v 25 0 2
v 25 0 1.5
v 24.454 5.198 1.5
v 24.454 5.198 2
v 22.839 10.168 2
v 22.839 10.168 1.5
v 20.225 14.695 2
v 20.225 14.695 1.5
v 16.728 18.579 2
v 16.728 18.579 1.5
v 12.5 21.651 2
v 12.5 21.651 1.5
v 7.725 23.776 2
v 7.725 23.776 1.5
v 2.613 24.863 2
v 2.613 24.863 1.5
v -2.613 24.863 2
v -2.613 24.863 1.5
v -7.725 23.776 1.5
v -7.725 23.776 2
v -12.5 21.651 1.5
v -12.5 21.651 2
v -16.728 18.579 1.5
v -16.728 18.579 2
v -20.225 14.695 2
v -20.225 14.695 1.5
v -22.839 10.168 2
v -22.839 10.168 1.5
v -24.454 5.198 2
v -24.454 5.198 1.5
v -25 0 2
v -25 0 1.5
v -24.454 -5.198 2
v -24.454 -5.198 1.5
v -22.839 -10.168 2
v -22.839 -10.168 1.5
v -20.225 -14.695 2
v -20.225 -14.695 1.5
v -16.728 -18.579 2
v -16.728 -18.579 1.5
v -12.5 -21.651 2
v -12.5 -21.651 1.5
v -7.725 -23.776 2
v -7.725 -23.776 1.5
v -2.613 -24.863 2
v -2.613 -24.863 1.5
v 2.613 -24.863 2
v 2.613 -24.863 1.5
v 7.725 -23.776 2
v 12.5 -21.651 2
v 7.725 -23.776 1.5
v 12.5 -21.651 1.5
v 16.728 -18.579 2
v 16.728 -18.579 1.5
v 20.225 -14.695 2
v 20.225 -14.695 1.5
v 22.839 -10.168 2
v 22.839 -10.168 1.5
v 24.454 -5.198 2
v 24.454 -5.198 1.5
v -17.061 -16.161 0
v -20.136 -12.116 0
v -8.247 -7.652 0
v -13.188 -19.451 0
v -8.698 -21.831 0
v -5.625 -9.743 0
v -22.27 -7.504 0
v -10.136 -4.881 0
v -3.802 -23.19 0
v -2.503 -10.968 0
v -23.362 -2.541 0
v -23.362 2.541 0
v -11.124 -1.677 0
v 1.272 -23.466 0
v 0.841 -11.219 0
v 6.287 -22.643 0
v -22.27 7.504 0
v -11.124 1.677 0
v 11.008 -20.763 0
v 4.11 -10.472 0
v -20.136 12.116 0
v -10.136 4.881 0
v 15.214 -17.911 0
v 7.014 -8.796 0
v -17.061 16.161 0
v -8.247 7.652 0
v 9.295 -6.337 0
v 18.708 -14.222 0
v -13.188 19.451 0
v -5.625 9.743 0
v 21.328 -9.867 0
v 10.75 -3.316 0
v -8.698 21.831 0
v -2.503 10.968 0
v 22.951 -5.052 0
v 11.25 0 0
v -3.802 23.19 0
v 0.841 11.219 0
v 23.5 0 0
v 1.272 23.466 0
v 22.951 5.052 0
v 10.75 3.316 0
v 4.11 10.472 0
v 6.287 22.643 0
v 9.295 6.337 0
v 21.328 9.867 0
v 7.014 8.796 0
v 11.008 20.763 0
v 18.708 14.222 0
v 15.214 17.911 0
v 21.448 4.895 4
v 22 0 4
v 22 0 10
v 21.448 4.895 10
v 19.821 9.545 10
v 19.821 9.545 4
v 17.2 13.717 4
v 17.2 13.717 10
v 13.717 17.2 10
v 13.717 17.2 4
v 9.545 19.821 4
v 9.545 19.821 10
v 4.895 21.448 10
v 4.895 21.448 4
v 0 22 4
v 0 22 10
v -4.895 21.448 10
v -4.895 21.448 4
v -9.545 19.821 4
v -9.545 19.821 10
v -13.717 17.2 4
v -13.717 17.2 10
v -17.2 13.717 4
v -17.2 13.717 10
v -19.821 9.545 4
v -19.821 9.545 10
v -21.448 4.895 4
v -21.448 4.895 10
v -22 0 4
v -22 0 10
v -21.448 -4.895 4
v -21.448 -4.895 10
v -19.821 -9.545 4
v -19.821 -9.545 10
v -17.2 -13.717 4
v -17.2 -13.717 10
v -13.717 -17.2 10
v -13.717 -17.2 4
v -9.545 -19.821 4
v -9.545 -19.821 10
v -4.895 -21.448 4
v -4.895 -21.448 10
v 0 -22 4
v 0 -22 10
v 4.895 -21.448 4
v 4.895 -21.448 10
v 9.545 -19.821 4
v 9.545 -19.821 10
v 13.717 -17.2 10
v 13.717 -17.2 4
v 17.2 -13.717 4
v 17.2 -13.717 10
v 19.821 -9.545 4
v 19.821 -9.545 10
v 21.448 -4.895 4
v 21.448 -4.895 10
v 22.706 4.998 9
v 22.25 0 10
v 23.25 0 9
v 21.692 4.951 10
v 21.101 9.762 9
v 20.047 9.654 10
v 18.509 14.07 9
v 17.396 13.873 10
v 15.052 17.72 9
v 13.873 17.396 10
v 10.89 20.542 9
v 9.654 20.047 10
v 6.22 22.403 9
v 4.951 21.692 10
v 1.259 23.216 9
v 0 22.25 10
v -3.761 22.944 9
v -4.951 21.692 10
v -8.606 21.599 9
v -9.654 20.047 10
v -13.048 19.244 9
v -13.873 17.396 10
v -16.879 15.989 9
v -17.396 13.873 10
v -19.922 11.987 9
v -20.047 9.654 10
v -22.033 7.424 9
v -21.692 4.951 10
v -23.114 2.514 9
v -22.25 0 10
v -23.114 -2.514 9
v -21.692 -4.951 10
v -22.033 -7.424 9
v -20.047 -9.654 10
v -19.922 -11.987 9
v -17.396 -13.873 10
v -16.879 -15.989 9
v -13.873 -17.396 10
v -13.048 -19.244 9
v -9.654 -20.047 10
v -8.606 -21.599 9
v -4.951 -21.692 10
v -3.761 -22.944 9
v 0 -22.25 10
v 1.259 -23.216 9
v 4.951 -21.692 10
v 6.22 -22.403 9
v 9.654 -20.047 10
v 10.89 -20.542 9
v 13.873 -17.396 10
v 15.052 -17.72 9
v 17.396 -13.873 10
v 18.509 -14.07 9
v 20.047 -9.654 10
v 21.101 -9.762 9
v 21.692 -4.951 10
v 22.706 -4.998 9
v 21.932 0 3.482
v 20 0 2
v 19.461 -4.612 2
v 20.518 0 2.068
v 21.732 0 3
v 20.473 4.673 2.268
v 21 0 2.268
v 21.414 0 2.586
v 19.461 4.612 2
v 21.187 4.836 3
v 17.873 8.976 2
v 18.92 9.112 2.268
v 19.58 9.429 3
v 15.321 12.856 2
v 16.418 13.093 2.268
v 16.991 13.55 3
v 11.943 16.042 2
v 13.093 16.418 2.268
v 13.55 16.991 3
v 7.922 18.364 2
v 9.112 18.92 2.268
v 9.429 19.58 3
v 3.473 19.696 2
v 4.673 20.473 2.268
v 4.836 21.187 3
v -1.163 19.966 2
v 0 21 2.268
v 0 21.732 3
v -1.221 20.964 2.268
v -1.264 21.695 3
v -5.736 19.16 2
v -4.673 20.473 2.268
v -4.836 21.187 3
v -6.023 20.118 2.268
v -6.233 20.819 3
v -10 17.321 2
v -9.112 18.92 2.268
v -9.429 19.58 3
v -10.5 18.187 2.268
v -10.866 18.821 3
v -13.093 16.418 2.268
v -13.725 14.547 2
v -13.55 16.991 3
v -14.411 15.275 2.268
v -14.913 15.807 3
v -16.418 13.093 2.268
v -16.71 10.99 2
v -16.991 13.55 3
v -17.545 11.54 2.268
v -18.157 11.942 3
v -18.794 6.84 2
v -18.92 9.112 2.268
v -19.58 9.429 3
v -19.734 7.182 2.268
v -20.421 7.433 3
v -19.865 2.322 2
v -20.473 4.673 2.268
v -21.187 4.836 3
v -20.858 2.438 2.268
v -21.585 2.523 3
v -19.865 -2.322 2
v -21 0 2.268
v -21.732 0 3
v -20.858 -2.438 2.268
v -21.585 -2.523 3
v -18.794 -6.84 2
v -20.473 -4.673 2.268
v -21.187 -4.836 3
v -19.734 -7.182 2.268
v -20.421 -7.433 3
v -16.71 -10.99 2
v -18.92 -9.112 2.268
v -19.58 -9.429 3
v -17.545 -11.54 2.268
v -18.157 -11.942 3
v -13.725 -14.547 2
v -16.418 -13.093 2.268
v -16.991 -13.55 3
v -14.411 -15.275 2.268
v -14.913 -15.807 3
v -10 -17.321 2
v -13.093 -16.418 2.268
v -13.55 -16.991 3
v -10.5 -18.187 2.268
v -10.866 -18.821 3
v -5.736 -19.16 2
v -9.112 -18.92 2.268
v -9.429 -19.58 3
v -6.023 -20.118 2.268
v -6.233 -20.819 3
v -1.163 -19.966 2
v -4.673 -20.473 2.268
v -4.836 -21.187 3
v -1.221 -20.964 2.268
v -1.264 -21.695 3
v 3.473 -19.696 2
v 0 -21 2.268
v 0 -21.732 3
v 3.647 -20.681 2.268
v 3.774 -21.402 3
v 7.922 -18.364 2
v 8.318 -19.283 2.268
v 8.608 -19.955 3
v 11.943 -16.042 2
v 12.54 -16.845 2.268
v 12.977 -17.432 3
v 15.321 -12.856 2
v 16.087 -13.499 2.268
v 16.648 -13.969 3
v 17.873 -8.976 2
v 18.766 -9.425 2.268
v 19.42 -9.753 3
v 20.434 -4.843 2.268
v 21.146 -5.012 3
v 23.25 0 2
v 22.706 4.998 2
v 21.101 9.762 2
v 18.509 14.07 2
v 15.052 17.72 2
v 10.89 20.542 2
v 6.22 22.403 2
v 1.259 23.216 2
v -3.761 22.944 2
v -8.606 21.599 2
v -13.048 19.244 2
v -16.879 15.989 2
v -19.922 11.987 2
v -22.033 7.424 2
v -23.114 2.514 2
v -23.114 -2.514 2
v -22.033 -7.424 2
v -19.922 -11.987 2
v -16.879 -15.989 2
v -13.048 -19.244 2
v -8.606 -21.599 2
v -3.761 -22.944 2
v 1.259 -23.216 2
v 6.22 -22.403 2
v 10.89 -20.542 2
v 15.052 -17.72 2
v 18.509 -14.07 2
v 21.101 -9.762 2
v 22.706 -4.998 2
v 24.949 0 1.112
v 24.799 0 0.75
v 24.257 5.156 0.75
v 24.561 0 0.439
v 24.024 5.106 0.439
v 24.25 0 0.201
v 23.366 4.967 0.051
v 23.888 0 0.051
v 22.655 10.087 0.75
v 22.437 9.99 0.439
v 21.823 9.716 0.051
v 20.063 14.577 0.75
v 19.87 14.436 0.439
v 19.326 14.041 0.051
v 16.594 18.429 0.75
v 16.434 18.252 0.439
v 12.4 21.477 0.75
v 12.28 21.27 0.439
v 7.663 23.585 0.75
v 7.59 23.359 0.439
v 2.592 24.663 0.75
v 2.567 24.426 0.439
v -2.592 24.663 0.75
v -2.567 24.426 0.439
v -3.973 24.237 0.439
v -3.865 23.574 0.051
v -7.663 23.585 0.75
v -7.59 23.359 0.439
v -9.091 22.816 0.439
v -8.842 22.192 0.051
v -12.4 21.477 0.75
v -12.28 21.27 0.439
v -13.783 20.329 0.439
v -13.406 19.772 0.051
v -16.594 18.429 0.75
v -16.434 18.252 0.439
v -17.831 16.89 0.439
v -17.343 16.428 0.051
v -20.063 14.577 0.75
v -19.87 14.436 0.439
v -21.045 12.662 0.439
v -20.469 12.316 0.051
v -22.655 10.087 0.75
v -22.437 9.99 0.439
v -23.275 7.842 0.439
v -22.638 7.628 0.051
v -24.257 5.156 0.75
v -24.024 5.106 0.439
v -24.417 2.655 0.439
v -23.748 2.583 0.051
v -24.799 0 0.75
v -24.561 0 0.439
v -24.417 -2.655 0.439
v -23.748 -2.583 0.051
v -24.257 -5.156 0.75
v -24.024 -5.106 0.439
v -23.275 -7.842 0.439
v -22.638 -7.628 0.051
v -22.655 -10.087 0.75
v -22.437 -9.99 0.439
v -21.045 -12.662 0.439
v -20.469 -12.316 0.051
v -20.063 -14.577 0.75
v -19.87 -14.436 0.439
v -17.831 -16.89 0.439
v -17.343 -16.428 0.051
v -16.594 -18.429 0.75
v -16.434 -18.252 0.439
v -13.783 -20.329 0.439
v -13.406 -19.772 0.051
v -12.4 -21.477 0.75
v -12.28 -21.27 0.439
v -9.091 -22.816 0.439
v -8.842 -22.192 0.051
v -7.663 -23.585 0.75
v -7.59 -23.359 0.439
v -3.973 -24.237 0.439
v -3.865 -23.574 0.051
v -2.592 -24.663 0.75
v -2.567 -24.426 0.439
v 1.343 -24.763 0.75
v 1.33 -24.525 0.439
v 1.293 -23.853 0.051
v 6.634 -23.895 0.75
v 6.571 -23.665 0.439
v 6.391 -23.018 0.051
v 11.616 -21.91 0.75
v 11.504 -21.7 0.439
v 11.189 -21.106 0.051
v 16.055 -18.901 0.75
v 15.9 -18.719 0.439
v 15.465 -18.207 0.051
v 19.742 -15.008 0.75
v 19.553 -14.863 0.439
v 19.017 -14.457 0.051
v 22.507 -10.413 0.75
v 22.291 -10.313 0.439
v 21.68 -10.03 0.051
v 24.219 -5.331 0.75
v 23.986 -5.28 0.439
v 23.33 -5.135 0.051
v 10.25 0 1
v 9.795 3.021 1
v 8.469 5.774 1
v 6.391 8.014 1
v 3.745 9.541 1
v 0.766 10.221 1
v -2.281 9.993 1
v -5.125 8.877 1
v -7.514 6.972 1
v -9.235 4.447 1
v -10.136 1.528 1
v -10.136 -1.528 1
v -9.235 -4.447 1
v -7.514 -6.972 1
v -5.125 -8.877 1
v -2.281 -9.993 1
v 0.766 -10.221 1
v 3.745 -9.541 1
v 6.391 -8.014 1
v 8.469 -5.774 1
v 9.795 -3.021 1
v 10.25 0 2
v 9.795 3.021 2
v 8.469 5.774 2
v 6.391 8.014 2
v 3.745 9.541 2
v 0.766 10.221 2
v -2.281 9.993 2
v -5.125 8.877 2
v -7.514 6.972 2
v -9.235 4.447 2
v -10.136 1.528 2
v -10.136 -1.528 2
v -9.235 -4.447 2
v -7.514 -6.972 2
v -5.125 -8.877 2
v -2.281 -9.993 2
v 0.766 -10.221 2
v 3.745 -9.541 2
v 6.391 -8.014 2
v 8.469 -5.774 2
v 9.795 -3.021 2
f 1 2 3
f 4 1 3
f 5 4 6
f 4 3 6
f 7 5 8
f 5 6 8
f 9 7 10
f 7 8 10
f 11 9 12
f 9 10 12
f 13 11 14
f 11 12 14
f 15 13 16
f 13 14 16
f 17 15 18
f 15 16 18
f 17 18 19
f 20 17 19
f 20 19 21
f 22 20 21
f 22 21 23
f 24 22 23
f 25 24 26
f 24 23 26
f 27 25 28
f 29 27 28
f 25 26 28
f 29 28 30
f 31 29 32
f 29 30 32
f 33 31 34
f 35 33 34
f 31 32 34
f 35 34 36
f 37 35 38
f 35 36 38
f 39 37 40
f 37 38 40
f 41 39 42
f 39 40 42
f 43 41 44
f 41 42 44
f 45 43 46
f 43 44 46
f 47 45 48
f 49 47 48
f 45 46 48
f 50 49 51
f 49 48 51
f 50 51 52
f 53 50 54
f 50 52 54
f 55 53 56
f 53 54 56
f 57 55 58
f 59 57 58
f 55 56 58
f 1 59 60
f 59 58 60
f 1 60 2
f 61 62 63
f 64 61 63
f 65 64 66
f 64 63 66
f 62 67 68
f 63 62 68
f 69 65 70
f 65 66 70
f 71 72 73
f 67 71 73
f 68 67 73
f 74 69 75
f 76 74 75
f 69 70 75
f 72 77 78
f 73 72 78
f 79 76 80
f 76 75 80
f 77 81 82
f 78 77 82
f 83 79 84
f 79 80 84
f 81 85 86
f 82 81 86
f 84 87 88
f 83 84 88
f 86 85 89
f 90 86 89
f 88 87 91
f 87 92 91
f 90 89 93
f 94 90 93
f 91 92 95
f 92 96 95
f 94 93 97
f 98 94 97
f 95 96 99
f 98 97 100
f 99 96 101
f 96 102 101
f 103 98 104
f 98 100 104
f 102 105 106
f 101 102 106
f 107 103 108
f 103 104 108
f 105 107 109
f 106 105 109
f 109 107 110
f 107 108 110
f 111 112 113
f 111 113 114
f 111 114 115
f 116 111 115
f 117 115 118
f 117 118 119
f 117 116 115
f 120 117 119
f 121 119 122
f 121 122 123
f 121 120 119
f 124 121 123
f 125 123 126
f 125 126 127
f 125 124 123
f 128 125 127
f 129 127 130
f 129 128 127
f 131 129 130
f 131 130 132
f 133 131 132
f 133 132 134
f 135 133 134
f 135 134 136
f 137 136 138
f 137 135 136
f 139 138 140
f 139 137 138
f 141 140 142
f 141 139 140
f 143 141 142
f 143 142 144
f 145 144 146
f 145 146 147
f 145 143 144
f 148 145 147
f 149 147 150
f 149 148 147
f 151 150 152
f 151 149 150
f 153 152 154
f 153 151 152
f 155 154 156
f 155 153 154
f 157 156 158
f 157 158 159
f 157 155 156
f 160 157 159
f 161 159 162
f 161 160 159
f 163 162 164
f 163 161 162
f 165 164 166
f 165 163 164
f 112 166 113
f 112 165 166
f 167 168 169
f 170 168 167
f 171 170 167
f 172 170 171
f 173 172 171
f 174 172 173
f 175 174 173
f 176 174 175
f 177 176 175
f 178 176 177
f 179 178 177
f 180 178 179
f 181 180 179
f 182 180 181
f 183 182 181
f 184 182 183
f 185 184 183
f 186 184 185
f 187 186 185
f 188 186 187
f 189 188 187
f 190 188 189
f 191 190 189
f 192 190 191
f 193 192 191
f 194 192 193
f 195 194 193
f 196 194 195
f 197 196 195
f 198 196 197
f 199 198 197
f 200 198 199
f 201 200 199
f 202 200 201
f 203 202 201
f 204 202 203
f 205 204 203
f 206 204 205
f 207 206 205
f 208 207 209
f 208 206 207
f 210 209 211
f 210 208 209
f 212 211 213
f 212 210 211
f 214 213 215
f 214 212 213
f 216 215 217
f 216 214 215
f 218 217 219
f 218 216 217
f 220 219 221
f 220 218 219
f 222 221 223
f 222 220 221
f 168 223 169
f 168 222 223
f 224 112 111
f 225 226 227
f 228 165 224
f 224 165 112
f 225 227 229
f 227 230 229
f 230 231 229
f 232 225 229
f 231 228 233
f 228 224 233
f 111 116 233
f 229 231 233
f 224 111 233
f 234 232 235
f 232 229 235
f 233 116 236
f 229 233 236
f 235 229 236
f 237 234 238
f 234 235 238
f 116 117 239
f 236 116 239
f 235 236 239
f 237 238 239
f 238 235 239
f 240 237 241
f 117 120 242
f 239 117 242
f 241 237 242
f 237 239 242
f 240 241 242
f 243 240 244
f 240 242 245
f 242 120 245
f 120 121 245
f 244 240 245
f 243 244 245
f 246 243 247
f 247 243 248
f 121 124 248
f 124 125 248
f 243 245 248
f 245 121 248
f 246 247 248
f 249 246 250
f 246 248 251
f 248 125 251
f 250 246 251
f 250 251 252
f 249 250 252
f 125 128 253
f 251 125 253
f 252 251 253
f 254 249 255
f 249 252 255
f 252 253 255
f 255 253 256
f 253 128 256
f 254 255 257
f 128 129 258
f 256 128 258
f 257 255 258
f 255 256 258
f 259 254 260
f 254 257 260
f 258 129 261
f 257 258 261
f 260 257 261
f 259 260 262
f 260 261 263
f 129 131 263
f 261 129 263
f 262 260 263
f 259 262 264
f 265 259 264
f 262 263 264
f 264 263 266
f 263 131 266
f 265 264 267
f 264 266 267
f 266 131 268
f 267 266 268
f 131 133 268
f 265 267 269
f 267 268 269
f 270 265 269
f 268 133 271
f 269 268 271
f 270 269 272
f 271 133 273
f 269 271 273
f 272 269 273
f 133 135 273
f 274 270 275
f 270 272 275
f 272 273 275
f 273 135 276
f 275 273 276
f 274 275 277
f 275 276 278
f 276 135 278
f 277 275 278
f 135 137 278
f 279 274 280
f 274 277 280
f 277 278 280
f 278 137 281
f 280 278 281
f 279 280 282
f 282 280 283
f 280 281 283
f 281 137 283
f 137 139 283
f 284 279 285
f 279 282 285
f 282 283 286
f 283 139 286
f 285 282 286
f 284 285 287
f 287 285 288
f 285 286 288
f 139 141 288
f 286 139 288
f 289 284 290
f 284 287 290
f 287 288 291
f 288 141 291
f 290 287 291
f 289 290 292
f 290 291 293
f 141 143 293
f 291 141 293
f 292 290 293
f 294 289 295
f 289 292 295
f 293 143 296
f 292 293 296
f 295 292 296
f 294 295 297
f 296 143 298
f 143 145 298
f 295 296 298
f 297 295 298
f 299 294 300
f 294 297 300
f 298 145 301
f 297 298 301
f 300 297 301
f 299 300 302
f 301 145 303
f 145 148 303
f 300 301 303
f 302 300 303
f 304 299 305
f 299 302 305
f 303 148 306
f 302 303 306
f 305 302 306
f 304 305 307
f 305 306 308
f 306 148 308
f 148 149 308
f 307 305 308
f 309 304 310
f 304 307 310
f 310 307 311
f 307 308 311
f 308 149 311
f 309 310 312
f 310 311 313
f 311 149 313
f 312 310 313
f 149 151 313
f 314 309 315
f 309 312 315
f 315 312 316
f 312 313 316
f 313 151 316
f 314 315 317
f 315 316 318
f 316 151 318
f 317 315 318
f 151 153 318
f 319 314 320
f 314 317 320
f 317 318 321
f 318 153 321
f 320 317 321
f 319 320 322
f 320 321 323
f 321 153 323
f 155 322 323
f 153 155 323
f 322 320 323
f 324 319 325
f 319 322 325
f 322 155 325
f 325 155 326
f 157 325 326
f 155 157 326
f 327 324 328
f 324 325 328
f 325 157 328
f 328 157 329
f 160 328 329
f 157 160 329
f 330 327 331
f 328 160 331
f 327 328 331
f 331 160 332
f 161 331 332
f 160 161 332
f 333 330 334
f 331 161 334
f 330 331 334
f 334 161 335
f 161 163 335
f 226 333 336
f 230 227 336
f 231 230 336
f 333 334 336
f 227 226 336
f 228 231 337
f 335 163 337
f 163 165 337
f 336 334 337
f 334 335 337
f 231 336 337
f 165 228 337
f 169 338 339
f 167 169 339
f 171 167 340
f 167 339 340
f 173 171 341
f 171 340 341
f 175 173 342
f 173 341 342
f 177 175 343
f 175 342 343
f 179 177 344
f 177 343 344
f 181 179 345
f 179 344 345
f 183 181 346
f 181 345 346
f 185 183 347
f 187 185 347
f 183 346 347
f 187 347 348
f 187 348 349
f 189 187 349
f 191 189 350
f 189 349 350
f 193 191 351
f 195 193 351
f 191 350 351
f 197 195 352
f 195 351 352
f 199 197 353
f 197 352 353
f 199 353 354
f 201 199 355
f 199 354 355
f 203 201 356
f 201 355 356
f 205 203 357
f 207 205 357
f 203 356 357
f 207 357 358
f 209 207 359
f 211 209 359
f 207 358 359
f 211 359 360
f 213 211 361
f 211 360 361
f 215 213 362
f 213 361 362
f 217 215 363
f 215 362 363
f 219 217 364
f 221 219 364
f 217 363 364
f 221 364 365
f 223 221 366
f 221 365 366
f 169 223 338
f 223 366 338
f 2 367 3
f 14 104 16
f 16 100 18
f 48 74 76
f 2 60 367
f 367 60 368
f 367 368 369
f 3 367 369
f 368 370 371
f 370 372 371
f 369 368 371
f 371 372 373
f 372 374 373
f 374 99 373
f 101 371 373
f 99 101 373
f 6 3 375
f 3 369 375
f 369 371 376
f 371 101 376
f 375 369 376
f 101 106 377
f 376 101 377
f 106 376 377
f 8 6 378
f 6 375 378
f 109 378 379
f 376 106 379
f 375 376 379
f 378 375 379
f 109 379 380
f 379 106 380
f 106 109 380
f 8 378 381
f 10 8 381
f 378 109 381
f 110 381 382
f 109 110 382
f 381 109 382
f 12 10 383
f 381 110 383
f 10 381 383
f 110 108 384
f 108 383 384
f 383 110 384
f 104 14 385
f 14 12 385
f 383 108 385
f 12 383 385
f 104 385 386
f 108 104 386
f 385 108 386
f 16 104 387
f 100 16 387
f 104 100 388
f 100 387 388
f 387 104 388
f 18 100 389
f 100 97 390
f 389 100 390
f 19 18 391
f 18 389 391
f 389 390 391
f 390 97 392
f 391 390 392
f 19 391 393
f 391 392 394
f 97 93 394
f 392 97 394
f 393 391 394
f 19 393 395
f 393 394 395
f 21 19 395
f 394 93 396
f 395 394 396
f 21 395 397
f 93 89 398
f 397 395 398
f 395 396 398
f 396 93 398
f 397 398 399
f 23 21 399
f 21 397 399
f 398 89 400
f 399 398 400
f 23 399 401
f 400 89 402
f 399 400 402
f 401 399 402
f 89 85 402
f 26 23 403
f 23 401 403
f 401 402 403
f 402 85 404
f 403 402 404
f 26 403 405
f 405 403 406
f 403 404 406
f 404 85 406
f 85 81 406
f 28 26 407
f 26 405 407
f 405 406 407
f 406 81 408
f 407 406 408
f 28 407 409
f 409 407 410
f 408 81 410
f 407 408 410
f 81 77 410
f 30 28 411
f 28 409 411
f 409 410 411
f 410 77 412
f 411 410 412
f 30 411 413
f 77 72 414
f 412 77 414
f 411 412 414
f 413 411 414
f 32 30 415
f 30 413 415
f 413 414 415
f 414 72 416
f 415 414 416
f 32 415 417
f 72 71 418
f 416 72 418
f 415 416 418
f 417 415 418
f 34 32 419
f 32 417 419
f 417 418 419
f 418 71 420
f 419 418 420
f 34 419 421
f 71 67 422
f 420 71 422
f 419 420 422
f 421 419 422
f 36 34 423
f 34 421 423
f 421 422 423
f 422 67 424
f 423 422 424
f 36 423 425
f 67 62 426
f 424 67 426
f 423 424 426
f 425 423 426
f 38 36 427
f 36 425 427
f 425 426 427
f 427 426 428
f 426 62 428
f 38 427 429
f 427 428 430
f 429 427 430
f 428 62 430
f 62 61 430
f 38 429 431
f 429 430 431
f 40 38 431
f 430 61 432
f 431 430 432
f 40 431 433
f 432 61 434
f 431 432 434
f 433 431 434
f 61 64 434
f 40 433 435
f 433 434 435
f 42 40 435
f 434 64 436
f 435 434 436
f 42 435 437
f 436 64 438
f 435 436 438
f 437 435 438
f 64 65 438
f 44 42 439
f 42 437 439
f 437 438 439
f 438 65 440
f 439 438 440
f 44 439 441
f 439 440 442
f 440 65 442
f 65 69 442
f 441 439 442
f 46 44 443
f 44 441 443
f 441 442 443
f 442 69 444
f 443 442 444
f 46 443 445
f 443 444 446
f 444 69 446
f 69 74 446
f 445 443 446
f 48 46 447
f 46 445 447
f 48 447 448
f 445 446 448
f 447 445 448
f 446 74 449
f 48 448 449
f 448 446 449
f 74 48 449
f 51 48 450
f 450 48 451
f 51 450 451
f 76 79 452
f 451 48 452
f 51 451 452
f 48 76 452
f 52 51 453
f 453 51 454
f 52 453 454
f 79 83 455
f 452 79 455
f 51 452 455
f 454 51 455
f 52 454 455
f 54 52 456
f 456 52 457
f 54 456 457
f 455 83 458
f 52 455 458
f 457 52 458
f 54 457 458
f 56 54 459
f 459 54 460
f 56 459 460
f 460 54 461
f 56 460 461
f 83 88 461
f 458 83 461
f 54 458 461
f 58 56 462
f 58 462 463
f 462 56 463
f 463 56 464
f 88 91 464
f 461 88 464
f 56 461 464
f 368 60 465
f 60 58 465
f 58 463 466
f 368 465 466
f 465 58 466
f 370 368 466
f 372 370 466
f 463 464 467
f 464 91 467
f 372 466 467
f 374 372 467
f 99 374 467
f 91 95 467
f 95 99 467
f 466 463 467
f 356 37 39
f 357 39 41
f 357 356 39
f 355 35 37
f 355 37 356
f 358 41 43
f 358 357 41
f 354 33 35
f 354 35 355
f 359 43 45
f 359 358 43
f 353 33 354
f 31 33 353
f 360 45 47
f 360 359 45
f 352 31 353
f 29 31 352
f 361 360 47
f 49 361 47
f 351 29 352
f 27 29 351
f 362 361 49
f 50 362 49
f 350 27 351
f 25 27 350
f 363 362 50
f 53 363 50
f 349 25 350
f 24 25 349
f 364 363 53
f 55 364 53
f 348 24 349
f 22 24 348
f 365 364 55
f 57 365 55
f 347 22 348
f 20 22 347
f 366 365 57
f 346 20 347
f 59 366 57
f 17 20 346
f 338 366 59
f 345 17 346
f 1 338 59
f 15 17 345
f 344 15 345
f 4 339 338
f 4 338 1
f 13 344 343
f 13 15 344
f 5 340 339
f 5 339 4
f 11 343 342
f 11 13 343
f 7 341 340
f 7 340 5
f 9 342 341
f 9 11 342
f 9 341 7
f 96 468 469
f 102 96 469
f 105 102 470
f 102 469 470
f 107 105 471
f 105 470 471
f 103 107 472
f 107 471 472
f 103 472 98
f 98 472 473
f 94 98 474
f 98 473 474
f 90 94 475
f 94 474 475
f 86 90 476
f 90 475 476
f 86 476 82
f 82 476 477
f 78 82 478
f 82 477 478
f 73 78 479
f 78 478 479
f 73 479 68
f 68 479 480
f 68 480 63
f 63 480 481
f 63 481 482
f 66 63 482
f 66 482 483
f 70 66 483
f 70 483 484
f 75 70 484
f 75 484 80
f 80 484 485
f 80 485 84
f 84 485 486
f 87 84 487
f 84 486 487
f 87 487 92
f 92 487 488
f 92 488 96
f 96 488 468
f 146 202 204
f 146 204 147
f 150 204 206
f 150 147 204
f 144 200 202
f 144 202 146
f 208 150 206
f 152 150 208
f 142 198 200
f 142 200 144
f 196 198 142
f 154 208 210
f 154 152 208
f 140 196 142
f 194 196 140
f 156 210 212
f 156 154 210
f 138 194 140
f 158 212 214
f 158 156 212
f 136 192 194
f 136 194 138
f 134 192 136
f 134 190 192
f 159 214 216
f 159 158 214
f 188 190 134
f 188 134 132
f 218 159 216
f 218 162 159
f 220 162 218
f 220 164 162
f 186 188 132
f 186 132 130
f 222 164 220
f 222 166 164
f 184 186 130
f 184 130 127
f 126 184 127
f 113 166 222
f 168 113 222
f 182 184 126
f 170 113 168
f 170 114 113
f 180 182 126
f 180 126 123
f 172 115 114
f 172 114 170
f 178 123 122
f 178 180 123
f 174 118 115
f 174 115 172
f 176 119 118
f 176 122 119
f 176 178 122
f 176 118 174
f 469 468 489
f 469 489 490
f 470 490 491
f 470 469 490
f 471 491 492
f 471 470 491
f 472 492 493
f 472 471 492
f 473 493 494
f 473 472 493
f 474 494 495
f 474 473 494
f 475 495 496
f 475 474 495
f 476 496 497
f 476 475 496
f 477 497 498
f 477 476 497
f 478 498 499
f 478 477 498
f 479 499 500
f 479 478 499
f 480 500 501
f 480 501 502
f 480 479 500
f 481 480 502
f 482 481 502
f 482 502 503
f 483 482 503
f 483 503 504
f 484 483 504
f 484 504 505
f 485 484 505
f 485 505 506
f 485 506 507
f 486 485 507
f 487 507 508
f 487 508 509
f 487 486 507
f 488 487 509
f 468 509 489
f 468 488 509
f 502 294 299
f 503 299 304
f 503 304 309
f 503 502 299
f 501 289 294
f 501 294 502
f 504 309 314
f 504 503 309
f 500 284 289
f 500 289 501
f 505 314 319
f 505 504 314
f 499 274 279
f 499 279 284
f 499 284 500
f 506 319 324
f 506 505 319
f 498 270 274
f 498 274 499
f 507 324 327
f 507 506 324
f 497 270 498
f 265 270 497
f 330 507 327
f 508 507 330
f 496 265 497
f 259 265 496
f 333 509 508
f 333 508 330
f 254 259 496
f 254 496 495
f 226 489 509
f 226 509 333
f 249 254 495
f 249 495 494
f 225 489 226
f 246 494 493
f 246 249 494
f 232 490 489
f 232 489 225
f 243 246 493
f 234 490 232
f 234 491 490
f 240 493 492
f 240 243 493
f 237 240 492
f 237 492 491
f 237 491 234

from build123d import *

# Parameters (mm, degrees)
F0_R     = 25
F0_R_2   = 10.25
F1_DEPTH = 2
F2_R     = 23.25
F2_R_2   = 22
F3_DEPTH = 8
F4_SIZE  = 1
F5_R     = 1.5
F6_SIZE  = 1
F7_R     = 2


with BuildPart() as f1:
    # F0 (on Top) → F1 (new body)
    with BuildSketch(Plane.XY):
        Circle(F0_R)
        Circle(F0_R_2, mode=Mode.SUBTRACT)
    extrude(amount=F1_DEPTH)

    # F2 (on face) → F3 (join)
    with BuildSketch(Plane.XY.offset(2)):
        Circle(F2_R)
        Circle(F2_R_2, mode=Mode.SUBTRACT)
    extrude(amount=F3_DEPTH)

    # F4
    f4_edges = [f1.edges().sort_by_distance(p)[0] for p in [
        (-23.25, 0, 10),
    ]]
    chamfer(f4_edges, length=F4_SIZE)

    # F5
    f5_edges = [f1.edges().sort_by_distance(p)[0] for p in [
        (-25, 0, 0),
    ]]
    fillet(f5_edges, radius=F5_R)

    # F6
    f6_edges = [f1.edges().sort_by_distance(p)[0] for p in [
        (-10.25, 0, 0),
    ]]
    chamfer(f6_edges, length=F6_SIZE)

    # F7
    f7_edges = [f1.edges().sort_by_distance(p)[0] for p in [
        (-22, 0, 2),
    ]]
    fillet(f7_edges, radius=F7_R)


solid = f1.part
